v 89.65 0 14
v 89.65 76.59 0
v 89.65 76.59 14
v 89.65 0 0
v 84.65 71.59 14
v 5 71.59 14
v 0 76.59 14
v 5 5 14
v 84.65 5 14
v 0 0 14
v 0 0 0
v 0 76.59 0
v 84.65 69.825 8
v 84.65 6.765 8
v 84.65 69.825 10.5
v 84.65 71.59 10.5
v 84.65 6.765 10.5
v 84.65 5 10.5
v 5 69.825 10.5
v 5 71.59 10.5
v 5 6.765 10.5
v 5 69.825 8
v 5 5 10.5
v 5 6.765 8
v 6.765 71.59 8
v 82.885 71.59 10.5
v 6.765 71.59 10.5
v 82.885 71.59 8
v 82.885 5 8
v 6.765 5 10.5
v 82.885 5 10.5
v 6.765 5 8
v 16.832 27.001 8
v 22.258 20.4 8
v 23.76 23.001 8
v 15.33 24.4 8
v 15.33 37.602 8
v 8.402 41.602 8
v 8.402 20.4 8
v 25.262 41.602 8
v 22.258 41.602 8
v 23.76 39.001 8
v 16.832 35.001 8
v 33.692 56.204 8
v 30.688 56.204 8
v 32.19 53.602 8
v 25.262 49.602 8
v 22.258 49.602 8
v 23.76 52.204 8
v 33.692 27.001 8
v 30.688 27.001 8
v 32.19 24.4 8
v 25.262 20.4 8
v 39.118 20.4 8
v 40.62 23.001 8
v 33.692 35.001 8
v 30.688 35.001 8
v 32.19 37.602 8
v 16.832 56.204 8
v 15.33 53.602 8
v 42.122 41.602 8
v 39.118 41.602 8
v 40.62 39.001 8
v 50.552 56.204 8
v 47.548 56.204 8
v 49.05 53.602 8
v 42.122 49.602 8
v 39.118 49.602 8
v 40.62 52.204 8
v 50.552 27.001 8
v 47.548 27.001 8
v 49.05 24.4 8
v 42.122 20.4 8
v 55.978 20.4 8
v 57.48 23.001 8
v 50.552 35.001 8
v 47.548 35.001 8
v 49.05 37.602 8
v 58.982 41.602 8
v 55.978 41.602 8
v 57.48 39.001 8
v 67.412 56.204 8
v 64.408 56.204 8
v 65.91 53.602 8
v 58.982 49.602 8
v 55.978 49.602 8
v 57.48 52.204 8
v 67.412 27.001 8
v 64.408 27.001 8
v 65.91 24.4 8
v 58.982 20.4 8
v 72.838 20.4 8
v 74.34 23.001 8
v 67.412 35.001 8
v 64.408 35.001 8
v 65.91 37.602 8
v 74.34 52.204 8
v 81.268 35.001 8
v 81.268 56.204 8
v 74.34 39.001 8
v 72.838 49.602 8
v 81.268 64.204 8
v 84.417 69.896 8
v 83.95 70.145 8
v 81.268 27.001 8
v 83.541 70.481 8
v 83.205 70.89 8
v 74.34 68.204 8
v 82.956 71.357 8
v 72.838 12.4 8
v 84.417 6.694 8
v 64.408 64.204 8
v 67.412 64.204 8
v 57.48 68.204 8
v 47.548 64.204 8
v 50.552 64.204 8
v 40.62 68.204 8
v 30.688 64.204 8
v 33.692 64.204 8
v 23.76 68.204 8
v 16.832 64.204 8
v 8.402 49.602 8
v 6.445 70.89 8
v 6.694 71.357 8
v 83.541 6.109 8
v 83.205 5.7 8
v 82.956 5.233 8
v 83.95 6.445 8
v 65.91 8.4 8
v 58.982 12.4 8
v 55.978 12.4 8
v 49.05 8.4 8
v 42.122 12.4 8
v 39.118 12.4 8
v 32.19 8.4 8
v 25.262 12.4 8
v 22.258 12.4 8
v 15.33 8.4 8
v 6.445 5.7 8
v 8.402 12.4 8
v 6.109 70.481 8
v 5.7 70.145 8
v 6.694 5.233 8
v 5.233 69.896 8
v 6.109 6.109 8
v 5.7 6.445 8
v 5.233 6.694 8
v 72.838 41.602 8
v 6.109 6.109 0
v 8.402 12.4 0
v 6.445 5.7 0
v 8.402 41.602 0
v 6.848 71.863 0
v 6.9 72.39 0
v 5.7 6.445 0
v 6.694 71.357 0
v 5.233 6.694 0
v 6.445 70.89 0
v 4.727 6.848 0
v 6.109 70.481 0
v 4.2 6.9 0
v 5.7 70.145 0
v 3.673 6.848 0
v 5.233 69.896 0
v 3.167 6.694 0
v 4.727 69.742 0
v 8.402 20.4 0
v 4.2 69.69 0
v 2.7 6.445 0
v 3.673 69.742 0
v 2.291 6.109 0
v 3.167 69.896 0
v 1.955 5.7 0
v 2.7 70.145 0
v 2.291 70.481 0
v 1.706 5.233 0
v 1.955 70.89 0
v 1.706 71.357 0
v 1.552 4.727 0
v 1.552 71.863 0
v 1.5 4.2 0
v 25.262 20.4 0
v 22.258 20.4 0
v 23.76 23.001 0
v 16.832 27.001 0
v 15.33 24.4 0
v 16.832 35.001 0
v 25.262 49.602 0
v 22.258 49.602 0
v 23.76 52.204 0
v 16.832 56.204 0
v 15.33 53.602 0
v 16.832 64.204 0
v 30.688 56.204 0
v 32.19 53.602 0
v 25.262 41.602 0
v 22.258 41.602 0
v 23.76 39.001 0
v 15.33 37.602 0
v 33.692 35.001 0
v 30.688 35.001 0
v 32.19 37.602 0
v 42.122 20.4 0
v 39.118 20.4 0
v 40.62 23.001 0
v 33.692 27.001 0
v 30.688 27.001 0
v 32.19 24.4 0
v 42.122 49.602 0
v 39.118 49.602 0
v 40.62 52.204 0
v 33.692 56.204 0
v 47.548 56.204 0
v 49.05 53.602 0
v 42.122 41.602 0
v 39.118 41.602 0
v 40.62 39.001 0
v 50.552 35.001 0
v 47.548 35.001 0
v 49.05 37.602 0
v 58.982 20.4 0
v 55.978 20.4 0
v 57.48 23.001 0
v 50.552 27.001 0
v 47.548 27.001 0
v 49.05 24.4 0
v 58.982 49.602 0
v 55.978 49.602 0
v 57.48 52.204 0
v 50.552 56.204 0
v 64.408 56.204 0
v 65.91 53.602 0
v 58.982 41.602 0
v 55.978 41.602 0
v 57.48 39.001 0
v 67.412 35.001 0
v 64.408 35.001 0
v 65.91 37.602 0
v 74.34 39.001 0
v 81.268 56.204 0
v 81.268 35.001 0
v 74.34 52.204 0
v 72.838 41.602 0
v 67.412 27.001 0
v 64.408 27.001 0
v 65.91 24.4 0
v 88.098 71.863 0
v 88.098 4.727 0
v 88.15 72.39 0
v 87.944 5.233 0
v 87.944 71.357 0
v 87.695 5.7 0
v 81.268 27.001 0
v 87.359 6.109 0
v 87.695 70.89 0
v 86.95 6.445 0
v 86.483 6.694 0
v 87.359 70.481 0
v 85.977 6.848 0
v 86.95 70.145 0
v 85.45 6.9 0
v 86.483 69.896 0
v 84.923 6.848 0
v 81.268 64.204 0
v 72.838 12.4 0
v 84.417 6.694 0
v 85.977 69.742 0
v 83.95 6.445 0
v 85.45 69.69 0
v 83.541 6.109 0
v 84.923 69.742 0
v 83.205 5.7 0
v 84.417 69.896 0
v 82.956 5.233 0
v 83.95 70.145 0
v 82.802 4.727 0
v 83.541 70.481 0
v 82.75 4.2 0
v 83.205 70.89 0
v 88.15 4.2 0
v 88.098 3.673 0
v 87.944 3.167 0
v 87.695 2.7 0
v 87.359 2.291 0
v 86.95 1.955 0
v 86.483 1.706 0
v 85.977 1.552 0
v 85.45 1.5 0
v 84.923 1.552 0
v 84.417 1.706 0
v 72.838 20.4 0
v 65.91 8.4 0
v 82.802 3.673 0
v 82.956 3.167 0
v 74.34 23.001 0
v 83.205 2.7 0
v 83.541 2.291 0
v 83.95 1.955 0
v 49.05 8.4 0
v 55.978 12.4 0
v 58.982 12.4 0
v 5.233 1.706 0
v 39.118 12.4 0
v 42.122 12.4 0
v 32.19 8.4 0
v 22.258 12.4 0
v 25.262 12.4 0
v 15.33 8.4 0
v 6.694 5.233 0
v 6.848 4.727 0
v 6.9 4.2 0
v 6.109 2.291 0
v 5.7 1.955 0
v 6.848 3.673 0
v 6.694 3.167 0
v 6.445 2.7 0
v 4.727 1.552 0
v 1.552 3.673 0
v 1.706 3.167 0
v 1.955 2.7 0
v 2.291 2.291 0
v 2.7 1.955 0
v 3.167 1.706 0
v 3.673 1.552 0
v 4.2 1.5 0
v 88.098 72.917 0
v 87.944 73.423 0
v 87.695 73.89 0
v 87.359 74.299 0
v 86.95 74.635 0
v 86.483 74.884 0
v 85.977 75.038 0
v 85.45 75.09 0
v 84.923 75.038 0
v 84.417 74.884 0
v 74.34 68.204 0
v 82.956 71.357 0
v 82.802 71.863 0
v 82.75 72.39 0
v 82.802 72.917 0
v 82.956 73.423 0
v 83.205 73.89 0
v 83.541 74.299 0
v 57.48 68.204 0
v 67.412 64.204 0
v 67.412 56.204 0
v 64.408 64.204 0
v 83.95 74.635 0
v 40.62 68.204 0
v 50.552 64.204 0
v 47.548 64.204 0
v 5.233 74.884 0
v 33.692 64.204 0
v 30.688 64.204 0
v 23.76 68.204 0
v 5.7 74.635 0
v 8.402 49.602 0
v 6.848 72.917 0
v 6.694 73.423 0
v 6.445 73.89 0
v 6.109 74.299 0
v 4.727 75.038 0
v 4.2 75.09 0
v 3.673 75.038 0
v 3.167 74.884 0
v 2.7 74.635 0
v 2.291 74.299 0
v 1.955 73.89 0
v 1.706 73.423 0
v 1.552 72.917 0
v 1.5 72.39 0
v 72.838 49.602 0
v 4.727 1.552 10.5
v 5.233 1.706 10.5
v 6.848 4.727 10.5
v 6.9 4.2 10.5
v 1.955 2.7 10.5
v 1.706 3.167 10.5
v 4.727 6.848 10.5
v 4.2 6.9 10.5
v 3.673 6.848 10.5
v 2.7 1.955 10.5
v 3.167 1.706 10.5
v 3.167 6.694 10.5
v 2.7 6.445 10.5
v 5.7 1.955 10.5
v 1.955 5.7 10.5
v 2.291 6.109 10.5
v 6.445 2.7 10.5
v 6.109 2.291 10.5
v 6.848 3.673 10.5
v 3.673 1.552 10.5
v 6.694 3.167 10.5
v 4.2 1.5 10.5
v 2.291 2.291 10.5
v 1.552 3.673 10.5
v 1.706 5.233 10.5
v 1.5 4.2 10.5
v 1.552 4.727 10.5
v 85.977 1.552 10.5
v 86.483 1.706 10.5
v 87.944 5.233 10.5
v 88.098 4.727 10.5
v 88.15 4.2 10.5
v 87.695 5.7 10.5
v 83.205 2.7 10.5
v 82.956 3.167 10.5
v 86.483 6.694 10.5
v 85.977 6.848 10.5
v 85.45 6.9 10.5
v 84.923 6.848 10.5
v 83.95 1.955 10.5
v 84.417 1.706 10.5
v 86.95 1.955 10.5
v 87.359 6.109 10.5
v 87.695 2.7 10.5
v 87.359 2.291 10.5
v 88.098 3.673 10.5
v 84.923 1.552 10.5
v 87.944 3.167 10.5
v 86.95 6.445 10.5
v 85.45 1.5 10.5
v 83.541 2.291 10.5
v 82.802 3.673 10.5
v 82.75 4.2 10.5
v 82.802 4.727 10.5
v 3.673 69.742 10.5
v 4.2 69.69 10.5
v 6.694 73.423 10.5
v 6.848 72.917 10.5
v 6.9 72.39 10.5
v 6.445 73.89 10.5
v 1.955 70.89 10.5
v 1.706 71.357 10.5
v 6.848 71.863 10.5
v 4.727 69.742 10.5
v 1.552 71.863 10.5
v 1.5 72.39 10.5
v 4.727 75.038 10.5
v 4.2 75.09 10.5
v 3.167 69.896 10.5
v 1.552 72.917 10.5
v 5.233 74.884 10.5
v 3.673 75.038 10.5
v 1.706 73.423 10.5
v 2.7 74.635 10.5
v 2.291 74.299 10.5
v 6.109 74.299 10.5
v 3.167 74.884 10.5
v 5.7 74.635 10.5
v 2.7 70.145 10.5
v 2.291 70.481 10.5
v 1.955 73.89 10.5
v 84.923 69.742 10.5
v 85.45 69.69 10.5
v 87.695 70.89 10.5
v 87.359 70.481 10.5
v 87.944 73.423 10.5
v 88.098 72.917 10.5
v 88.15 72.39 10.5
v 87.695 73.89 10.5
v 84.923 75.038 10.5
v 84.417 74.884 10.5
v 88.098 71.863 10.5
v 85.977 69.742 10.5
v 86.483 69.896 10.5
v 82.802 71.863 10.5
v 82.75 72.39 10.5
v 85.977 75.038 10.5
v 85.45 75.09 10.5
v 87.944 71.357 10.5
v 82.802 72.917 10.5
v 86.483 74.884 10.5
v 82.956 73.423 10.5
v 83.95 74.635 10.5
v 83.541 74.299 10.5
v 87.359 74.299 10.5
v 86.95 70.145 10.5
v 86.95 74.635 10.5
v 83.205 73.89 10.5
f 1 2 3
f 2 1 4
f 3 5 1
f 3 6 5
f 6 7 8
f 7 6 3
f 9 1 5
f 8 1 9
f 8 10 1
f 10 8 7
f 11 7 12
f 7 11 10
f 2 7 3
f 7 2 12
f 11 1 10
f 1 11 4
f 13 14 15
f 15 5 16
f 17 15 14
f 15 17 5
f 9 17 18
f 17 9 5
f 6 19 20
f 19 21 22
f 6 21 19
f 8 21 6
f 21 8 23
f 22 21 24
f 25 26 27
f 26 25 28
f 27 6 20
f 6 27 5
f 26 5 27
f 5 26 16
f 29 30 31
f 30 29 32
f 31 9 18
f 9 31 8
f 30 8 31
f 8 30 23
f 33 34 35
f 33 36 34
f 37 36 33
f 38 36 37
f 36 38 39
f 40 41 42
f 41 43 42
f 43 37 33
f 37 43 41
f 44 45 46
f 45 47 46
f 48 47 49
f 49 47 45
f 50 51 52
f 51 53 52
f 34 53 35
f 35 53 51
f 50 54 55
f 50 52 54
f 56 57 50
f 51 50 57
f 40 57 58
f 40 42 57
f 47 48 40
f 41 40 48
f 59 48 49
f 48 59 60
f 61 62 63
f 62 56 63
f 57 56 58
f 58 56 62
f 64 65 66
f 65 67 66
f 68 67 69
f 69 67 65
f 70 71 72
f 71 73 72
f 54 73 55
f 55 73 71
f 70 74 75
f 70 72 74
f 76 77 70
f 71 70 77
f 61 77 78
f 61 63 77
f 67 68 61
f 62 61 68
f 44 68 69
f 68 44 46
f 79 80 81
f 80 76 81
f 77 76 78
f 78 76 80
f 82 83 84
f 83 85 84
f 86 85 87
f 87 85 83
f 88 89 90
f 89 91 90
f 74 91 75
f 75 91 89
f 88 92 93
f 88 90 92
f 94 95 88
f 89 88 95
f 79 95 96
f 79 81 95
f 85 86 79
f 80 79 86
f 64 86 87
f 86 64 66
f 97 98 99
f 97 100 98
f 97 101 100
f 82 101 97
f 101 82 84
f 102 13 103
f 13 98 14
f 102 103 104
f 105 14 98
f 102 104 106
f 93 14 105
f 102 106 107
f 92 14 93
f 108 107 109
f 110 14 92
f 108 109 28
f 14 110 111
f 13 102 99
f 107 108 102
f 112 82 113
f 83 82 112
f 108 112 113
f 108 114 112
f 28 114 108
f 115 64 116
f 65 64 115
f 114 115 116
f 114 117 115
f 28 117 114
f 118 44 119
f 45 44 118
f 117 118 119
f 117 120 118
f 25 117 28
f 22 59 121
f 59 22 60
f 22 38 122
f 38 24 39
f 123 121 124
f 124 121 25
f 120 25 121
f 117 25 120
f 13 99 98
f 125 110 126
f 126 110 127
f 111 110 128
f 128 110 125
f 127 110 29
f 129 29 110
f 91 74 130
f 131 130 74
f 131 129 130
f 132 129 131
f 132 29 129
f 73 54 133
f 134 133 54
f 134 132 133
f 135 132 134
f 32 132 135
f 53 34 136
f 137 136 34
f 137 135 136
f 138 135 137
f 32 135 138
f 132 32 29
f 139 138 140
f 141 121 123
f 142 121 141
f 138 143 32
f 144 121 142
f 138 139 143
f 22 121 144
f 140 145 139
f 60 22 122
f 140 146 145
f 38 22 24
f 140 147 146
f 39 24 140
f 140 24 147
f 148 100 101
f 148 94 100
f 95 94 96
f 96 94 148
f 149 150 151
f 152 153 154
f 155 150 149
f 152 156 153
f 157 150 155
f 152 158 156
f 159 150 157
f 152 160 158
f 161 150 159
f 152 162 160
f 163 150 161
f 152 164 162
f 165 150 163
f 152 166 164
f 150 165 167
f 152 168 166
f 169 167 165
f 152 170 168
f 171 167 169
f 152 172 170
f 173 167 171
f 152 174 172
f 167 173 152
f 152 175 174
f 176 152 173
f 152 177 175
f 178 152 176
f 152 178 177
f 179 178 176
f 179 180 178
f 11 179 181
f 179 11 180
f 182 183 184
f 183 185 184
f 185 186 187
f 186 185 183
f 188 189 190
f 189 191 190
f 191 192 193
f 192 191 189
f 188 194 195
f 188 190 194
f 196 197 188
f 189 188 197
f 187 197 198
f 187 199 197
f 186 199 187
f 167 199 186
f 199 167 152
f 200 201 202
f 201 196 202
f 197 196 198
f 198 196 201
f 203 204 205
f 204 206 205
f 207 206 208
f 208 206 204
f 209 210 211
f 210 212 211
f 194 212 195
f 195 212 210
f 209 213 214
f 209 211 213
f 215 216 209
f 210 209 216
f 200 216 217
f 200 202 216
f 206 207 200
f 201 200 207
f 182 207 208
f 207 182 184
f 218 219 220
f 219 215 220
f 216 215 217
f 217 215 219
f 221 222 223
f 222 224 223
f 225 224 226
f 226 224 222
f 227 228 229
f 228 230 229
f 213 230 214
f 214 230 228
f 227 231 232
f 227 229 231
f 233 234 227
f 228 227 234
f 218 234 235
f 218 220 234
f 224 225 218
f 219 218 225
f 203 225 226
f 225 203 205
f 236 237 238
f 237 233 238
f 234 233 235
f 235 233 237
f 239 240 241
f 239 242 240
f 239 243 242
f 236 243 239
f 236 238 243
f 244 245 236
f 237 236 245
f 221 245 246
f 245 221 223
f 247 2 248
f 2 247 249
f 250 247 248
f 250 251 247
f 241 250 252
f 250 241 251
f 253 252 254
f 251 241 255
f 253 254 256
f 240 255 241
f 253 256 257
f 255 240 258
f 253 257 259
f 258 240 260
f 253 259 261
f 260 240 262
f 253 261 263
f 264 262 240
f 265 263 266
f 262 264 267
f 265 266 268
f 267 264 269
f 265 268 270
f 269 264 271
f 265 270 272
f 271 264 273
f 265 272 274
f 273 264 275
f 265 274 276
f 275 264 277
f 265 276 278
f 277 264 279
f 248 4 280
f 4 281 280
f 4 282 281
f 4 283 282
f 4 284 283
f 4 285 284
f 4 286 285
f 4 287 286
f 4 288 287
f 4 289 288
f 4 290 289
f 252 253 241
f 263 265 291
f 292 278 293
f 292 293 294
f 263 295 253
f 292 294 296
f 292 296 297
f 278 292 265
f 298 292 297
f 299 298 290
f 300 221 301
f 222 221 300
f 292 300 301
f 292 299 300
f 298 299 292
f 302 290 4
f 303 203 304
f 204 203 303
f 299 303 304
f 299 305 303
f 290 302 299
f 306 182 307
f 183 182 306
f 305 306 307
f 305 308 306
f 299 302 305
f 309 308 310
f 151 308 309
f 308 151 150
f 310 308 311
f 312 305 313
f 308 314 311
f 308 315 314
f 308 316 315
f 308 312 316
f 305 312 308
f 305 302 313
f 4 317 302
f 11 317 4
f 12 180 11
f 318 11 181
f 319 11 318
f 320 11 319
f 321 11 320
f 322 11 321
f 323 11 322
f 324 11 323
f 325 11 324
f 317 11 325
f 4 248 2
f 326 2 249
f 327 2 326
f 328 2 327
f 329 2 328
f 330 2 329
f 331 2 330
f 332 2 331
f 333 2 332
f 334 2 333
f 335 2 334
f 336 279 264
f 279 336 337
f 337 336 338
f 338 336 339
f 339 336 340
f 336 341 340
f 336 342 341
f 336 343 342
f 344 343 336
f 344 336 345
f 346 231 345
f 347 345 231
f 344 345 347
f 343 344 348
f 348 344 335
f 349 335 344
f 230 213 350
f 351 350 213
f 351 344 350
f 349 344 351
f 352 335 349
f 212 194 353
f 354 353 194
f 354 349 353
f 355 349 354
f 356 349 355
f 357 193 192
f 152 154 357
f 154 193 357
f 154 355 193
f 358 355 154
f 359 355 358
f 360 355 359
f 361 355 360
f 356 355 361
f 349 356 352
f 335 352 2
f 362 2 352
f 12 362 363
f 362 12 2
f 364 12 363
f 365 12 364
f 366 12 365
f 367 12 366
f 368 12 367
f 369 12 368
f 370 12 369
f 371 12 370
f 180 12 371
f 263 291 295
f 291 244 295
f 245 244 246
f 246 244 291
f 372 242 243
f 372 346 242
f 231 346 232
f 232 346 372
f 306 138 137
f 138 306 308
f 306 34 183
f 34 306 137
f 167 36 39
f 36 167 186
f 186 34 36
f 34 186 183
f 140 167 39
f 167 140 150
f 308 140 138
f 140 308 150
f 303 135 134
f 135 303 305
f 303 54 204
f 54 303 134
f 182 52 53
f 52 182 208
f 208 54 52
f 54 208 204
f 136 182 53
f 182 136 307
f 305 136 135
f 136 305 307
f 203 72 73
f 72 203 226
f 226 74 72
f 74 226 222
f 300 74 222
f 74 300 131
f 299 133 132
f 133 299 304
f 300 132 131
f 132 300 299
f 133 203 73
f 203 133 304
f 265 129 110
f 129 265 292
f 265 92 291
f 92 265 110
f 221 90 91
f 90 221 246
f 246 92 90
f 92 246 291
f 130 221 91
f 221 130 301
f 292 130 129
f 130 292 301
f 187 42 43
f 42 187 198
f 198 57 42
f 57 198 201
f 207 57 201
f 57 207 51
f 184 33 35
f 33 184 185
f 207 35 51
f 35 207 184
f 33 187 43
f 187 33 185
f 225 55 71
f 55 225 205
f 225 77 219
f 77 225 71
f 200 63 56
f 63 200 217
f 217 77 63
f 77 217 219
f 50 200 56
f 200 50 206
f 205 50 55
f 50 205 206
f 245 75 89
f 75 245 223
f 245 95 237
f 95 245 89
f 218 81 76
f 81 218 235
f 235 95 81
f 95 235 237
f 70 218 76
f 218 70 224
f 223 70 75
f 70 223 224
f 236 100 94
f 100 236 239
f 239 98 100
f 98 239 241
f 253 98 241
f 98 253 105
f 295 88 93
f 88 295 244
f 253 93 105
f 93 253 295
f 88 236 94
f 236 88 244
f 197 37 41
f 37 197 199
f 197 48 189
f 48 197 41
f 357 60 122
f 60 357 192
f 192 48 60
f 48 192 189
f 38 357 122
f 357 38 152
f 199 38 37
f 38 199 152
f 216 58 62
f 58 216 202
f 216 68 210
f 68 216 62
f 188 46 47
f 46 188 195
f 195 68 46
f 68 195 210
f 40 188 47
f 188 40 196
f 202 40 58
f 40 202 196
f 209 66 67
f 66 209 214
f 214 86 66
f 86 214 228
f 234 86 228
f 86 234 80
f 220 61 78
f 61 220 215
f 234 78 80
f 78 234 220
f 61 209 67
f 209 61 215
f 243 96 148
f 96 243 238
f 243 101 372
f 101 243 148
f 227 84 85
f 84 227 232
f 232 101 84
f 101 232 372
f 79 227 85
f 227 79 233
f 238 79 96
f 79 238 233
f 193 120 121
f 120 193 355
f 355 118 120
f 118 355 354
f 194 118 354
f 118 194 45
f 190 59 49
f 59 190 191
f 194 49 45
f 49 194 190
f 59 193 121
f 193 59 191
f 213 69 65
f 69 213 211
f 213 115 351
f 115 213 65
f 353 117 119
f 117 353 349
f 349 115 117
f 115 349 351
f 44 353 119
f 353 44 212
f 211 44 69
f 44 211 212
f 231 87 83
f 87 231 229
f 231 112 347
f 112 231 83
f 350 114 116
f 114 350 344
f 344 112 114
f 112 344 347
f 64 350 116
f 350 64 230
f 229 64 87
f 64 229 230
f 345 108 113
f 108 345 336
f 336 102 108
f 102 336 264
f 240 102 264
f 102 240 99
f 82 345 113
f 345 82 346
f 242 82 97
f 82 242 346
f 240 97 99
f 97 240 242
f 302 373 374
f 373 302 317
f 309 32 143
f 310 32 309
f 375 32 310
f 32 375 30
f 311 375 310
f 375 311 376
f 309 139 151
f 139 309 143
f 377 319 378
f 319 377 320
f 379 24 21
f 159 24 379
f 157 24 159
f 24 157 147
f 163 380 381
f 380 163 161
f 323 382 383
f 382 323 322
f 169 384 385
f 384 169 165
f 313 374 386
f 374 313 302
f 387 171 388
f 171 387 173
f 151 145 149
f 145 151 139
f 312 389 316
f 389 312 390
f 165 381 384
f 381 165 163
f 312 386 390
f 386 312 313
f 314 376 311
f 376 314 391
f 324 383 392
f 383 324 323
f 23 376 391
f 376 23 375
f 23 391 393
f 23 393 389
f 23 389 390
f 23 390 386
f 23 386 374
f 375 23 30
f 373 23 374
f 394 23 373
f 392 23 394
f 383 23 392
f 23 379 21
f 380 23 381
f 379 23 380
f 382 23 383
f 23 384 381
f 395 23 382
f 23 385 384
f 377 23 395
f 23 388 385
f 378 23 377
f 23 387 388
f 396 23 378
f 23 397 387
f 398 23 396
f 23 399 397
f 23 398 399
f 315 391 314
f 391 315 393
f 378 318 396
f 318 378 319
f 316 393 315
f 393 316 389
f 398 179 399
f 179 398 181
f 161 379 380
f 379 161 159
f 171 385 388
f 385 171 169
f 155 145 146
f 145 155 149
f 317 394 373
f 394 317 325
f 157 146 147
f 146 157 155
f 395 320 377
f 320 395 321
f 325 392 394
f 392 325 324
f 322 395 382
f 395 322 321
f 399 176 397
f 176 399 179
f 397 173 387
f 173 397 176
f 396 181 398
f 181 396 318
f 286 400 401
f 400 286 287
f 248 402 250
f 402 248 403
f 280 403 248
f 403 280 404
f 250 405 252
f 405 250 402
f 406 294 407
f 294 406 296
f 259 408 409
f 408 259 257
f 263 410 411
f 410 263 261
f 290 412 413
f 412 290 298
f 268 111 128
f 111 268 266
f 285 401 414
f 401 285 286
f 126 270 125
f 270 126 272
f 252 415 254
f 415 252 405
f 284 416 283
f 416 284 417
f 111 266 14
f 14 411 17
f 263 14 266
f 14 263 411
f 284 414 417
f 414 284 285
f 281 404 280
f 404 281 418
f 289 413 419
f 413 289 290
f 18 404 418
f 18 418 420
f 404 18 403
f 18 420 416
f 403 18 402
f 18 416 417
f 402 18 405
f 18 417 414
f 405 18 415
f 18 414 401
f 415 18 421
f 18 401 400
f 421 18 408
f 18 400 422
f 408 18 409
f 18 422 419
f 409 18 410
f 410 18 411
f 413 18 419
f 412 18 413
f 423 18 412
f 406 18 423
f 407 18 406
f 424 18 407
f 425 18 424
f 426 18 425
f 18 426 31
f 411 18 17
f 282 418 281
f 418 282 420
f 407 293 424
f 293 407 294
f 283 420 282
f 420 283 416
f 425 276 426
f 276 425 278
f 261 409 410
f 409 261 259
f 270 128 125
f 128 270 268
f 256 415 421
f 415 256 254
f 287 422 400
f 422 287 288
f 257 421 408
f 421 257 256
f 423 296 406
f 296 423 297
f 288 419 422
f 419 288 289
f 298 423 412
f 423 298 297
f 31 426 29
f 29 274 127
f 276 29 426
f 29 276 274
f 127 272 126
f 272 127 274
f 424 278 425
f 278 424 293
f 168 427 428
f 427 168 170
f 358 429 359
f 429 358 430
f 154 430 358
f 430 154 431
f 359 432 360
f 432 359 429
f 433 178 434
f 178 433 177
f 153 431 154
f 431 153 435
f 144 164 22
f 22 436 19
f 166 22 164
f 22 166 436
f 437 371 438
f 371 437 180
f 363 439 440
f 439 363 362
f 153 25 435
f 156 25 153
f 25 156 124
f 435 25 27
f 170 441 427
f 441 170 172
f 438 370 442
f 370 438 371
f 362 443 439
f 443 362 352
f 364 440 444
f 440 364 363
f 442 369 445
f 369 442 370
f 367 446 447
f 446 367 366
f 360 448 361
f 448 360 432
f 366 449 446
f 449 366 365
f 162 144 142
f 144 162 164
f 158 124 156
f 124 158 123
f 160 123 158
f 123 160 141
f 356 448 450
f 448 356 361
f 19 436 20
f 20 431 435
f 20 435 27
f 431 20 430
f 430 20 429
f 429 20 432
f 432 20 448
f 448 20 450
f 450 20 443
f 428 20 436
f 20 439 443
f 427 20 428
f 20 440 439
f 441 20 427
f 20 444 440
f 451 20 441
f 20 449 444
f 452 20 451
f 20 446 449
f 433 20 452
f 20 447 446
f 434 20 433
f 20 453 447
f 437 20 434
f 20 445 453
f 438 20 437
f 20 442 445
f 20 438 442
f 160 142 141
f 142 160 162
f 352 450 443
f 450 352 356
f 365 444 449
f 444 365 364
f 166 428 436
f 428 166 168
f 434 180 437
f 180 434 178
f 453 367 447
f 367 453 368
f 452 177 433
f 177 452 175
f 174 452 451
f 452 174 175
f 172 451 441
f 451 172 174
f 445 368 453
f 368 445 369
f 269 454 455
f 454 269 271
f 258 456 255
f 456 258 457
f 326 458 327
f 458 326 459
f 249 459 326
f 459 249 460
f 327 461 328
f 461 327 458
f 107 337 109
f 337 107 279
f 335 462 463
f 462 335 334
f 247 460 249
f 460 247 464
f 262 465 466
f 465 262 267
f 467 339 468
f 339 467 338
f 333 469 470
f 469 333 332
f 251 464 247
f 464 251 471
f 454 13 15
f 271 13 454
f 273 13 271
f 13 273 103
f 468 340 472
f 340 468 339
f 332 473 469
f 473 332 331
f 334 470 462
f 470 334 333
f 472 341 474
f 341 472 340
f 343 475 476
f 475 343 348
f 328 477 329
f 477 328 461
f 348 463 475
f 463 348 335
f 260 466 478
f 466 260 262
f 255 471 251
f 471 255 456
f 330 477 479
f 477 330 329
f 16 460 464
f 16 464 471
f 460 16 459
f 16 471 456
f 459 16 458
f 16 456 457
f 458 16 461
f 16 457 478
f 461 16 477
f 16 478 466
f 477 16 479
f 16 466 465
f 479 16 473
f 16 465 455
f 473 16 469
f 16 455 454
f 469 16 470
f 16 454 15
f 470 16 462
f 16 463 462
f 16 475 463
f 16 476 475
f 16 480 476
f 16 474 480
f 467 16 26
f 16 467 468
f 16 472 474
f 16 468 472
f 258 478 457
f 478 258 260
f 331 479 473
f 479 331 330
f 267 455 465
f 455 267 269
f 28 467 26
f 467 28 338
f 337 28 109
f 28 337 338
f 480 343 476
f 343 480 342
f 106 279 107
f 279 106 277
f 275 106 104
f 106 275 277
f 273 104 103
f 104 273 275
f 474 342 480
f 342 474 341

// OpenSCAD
$fn = 32;

// ----------------------------------------------------------------------
// Honeycomb panel: 89.65 x 76.59 mm, 16 cells of 16 mm
// ----------------------------------------------------------------------

// --- parameters (mm) ---
panel_w = 89.65;          // panel width
panel_d = 76.59;          // panel depth
thick = 8;                // panel thickness
cell_r = 8;               // hex cell circumradius
pitch = 16.86;            // hex cell pitch (centre to centre)
web = 3;                  // web between the cells
columns = 4;              // columns of cells
rows = 4;                 // rows of cells
cell_count = 16;          // total cells
shift_x = 15.33;          // first cell offset in x
shift_y = 16.4;           // first cell offset in y
mount_d = 5.4;            // corner mounting holes
hole_off = 4.2;           // mounting hole offset from the corners
rim_h = 14;               // rim height
rim_t = 5;                // rim wall thickness

difference() {
  union() {
    cube([panel_w, panel_d, thick]);
    /* rim around the panel, sunk 1 mm into the plate */
    translate([0, 0, thick - 1]) difference() {
      cube([panel_w, panel_d, rim_h - thick + 1]);
      translate([rim_t, rim_t, -2.5]) cube([panel_w - 2 * rim_t, panel_d - 2 * rim_t, rim_h - thick + 6]);
    }
  }
  /* hexagonal cells, point-up, cut right through the plate */
  for (row = [0 : rows - 1]) {
    for (col = [0 : columns - 1]) {
      translate([shift_x + col * pitch + (row % 2) * pitch / 2, shift_y + row * pitch * 0.866025, -2.5]) rotate([0, 0, 30]) cylinder(h = thick + 5, d = 2 * cell_r, $fn = 6);
    }
  }
  /* corner mounting holes, clear of the outer cell web */
  translate([4.2, 4.2, -2.5]) cylinder(h = thick + 5, d = mount_d);
  translate([85.45, 4.2, -2.5]) cylinder(h = thick + 5, d = mount_d);
  translate([4.2, 72.39, -2.5]) cylinder(h = thick + 5, d = mount_d);
  translate([85.45, 72.39, -2.5]) cylinder(h = thick + 5, d = mount_d);
}
